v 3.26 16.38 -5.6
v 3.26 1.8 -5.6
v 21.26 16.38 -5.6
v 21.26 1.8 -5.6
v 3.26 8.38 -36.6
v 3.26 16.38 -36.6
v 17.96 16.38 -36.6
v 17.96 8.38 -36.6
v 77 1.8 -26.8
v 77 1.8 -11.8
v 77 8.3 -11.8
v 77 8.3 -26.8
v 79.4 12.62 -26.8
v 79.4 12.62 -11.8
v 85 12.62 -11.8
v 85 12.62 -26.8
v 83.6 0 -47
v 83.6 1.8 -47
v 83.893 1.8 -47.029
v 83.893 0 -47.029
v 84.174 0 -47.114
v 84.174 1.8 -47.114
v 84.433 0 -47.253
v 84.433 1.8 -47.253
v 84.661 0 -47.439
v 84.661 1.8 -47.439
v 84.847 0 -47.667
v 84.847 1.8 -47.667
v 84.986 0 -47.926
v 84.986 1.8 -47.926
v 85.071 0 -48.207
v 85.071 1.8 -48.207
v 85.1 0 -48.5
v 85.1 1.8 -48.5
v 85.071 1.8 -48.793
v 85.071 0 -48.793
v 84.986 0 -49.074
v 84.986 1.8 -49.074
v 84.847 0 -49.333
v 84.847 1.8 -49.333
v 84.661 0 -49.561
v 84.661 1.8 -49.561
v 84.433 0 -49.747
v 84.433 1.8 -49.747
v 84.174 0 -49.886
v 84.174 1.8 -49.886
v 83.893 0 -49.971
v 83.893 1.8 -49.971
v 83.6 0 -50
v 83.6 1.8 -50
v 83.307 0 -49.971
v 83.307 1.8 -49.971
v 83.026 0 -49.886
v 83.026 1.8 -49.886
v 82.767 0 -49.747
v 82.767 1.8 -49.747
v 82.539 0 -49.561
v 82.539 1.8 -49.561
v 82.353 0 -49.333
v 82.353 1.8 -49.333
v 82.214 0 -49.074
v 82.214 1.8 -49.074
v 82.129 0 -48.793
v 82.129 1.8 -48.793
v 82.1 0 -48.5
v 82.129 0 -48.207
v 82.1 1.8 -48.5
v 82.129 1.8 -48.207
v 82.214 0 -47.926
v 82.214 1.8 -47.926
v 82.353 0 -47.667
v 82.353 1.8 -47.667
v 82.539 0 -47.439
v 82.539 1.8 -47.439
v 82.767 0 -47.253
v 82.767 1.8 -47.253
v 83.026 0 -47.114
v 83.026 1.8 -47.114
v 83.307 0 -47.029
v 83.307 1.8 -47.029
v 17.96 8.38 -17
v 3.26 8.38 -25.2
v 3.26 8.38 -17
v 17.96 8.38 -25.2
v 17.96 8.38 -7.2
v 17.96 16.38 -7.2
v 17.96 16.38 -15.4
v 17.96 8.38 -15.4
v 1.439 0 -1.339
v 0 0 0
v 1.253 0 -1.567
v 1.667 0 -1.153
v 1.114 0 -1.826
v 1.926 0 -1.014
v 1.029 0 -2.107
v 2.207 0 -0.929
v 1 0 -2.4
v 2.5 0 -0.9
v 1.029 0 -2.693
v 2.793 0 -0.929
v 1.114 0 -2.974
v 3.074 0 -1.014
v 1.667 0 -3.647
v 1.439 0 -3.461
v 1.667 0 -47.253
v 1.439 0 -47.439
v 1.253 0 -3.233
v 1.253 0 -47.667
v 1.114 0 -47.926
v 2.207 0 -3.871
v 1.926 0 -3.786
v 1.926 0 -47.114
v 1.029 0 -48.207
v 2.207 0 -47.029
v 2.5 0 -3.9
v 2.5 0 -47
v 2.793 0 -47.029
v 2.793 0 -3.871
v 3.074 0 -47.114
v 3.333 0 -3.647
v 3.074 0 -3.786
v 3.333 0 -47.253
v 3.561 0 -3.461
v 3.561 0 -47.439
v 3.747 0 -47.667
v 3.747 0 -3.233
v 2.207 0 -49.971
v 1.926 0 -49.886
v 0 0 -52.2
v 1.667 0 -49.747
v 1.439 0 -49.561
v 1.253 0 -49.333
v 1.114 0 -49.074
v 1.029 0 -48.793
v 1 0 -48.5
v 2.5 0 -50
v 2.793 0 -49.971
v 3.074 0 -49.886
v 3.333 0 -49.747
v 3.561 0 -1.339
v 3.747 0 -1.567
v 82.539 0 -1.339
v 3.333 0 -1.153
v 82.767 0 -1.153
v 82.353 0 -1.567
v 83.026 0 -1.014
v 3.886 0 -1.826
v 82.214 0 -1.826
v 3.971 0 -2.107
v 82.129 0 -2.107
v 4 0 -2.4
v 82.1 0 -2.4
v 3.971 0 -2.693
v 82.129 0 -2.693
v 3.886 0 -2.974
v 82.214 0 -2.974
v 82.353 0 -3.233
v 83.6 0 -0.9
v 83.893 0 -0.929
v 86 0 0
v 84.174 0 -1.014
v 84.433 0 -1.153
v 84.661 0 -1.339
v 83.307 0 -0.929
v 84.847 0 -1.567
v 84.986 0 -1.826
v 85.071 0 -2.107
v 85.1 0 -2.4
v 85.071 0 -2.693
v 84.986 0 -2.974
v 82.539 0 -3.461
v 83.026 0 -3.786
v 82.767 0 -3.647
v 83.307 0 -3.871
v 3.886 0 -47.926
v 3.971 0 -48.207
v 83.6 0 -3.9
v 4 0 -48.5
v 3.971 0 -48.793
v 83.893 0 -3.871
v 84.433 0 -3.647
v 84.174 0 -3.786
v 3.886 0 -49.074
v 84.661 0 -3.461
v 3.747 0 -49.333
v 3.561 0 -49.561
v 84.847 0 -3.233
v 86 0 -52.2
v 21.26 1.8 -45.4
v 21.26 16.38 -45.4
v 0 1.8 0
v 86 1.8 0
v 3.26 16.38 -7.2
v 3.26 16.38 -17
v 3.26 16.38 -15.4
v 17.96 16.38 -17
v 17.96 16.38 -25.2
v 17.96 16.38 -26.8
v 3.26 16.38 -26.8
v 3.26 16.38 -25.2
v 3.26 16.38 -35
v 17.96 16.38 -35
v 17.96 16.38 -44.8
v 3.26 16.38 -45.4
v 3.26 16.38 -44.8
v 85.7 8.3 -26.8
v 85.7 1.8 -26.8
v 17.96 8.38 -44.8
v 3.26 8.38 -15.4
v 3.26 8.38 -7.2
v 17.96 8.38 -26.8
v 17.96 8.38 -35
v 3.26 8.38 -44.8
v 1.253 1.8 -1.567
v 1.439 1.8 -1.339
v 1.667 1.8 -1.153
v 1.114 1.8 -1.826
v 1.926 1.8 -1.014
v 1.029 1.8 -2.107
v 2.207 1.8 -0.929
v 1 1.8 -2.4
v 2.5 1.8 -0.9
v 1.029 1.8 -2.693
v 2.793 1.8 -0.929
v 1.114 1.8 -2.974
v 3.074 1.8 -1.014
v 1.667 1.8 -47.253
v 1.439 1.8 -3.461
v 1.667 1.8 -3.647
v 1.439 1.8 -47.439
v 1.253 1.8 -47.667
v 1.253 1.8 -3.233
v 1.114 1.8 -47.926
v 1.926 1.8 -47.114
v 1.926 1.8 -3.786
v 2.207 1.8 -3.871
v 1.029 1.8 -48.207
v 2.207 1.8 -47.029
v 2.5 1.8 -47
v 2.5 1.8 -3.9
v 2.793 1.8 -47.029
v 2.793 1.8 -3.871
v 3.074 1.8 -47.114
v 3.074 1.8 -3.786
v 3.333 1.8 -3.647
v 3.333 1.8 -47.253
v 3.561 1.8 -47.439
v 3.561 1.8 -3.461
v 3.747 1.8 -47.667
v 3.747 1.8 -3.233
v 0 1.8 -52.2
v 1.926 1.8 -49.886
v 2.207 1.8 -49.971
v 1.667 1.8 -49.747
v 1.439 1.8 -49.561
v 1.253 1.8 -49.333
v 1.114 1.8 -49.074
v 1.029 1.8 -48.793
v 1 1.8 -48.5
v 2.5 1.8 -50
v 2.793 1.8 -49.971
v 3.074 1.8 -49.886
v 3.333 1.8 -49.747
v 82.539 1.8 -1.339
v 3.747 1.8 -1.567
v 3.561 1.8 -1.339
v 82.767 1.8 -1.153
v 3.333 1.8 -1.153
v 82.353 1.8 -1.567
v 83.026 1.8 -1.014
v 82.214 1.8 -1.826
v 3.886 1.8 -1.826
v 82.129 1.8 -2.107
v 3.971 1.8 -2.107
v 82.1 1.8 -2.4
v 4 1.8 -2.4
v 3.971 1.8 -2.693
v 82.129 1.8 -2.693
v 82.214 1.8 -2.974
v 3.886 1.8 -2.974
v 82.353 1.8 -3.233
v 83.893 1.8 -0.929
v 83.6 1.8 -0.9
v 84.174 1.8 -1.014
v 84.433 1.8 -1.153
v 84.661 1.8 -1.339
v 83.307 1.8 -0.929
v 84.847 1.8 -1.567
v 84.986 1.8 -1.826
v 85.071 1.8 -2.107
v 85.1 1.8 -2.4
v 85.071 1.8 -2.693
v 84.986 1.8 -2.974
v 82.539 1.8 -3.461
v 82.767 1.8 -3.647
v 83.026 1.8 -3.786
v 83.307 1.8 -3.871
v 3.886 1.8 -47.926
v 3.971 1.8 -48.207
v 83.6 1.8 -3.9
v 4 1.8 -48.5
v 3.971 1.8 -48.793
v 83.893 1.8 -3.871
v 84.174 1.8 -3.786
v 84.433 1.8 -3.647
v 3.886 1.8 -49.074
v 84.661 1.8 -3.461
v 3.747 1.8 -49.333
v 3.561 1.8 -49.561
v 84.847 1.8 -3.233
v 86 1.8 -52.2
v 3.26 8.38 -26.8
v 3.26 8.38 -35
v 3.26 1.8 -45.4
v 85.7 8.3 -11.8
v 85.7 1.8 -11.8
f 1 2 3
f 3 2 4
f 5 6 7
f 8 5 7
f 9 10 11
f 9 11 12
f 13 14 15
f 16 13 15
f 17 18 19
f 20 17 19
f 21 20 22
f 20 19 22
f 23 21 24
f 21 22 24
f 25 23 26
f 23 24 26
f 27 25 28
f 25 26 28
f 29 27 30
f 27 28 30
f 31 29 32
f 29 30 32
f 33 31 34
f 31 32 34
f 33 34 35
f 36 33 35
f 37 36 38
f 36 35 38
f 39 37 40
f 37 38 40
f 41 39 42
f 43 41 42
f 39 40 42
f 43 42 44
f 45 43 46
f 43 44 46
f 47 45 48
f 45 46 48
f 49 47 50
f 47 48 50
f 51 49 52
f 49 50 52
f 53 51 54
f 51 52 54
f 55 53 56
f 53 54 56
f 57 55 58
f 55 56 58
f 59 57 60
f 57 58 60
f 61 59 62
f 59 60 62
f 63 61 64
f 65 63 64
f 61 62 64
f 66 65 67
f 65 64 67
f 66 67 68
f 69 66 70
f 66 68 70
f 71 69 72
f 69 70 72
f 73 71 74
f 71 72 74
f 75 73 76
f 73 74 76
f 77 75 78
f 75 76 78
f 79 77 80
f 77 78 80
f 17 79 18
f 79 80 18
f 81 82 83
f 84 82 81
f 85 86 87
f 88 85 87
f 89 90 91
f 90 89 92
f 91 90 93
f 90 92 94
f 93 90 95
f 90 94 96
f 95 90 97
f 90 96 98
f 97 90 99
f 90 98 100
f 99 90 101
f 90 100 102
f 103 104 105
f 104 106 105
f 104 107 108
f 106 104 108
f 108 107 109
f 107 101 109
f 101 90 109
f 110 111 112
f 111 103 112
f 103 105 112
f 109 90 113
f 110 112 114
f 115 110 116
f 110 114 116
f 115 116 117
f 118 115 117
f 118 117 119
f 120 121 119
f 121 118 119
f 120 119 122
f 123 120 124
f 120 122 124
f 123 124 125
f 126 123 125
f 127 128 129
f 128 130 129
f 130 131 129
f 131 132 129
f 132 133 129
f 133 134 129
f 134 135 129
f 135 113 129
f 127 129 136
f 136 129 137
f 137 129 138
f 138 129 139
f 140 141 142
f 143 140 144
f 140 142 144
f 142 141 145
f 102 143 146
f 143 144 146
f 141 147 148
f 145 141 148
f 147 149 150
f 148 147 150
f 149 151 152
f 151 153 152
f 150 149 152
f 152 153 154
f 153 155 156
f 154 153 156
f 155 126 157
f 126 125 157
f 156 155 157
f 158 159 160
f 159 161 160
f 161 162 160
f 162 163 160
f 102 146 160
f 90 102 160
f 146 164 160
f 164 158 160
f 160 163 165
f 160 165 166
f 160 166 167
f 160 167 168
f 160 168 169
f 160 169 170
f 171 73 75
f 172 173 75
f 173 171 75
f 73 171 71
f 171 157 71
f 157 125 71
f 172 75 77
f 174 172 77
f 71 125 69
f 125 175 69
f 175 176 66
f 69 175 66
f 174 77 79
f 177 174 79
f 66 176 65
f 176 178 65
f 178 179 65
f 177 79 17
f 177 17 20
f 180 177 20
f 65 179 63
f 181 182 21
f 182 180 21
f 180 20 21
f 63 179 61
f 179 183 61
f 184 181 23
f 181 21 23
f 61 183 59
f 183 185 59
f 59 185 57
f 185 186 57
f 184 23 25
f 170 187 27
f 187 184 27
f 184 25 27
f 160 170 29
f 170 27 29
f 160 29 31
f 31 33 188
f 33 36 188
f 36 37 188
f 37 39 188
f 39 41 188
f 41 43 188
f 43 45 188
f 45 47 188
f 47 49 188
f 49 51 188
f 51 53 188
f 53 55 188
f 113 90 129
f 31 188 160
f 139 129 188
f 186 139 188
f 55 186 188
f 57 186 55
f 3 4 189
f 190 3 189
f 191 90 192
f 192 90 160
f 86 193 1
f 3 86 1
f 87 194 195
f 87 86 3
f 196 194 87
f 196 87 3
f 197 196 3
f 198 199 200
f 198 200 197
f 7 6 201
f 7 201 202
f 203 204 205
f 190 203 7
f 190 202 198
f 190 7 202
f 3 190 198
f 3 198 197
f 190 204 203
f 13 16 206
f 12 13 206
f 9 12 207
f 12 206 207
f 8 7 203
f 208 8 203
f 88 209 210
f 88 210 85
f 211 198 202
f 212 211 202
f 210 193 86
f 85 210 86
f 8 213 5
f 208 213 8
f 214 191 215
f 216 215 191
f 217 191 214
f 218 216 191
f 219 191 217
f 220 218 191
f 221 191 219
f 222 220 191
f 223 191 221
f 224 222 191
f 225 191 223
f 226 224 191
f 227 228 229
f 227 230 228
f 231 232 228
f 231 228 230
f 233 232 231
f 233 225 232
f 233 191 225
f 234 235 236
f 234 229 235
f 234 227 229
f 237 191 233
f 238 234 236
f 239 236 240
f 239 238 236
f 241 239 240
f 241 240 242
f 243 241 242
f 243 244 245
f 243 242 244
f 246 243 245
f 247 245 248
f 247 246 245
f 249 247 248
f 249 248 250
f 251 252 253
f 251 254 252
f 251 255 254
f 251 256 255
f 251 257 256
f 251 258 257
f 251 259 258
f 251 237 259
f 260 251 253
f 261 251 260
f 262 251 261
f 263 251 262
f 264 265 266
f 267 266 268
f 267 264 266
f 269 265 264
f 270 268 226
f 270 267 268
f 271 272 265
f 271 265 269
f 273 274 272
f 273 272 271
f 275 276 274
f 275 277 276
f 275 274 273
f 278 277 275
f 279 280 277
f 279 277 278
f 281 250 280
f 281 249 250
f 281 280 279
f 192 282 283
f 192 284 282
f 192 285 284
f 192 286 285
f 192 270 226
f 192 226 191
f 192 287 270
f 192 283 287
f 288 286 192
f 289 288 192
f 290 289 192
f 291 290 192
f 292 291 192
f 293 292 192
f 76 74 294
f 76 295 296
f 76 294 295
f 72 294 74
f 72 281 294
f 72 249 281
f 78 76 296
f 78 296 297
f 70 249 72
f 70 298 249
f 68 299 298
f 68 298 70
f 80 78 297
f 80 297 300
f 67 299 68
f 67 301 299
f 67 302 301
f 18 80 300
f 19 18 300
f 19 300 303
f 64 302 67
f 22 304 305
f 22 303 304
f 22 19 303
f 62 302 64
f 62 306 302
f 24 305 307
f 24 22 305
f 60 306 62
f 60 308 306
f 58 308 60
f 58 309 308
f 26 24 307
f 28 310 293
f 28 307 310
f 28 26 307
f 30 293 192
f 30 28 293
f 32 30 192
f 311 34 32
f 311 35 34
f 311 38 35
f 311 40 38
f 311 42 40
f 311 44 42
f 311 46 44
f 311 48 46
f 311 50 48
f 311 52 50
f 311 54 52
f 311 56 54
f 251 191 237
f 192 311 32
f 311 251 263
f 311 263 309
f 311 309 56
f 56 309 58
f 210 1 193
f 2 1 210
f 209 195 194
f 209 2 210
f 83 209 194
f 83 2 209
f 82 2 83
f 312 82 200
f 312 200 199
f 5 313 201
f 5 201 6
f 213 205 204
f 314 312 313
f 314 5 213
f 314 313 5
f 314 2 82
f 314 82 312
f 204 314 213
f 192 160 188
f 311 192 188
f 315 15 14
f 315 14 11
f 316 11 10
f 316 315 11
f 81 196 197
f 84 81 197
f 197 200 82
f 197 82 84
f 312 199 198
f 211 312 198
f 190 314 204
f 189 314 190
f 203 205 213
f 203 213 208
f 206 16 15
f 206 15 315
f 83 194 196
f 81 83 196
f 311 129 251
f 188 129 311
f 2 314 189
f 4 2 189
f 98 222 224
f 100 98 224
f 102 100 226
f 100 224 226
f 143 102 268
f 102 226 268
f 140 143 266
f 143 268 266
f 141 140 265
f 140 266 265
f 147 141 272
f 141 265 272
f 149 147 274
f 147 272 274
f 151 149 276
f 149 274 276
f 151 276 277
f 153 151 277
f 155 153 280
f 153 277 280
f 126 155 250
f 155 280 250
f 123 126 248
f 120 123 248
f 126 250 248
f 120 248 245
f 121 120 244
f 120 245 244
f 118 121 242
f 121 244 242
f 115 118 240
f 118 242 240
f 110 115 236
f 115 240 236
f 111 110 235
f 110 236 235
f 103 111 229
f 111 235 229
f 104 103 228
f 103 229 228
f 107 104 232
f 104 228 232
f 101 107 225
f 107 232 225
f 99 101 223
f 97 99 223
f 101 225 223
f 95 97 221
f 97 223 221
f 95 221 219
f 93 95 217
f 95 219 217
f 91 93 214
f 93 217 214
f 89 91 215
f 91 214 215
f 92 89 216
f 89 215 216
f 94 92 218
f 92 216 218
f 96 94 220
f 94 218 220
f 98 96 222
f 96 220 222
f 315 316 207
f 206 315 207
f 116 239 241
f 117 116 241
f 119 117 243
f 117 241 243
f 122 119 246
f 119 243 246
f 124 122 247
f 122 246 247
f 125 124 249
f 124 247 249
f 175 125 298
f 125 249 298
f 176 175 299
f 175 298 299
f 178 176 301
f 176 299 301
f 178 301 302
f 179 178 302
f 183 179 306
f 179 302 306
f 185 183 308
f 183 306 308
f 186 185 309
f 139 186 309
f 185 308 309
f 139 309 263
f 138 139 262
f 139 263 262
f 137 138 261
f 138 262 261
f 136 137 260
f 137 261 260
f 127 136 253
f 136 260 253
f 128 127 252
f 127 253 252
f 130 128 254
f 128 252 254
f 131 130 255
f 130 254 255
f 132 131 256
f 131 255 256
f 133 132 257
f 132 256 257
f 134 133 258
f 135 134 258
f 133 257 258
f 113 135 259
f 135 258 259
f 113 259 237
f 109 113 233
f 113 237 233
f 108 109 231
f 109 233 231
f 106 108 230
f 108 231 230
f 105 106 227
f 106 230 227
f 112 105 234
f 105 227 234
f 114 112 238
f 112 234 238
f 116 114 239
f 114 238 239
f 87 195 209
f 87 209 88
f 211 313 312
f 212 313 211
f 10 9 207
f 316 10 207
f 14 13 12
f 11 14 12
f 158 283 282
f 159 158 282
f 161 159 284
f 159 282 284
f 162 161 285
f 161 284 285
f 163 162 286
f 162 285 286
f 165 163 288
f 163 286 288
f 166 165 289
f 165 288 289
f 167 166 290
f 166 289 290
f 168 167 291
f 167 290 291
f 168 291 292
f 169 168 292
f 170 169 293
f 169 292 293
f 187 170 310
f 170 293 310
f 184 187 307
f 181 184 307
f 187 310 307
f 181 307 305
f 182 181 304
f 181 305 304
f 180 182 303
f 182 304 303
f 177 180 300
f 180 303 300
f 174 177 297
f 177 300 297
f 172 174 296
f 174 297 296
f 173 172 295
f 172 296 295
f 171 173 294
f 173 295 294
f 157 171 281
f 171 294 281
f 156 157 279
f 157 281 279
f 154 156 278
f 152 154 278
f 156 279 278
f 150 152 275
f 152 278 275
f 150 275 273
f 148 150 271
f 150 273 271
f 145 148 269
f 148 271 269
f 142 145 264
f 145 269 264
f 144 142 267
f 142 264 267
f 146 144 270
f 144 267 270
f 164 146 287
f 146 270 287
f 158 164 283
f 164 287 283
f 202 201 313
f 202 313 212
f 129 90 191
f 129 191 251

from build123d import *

# Parameters (mm, degrees)
SKETCH1_W           = 86
SKETCH1_H           = 52.2
BOSS_EXTRUDE1_DEPTH = 1.8
SKETCH3_R           = 1.5
CUT_EXTRUDE1_DEPTH  = 1.8
SKETCH4_W           = 8.7
SKETCH4_H           = 15
BOSS_EXTRUDE2_DEPTH = 6.5
SKETCH5_W           = 5.6
SKETCH5_H           = 15
BOSS_EXTRUDE3_DEPTH = 4.32
RIB11_REACH         = 94.939
SKETCH7_WALL_W      = 192.82008193
SKETCH7_WALL_H      = 15
RIB14_REACH         = 94.939
SKETCH8_WALL_W      = 192.25452497
SKETCH8_WALL_H      = 15
SKETCH9_W           = 18
SKETCH9_H           = 39.8
BOSS_EXTRUDE4_DEPTH = 14.58
SKETCH10_W          = 14.7
SKETCH10_H          = 8.2
CUT_EXTRUDE2_DEPTH  = 8


with BuildPart() as part:
    # Sketch1 → Boss-Extrude1 (new body)
    with BuildSketch(Plane(origin=(0, 0, 0), x_dir=(1, 0, 0), z_dir=(0, 1, 0))):
        with Locations((43, 26.1)):
            Rectangle(SKETCH1_W, SKETCH1_H)
    extrude(amount=BOSS_EXTRUDE1_DEPTH)

    # Sketch3 → Cut-Extrude1 (cut)
    with BuildSketch(Plane(origin=(0, 1.8, 0), x_dir=(1, 0, 0), z_dir=(0, 1, 0))):
        with Locations(Location((83.6, 2.4, 0), (0, 0, 270))):
            Circle(SKETCH3_R)
        with Locations(Location((83.6, 48.5, 0), (0, 0, 270))):
            Circle(SKETCH3_R)
        with Locations(Location((2.5, 2.4, 0), (0, 0, 270))):
            Circle(SKETCH3_R)
        with Locations(Location((2.5, 48.5, 0), (0, 0, 270))):
            Circle(SKETCH3_R)
    extrude(amount=-CUT_EXTRUDE1_DEPTH, mode=Mode.SUBTRACT)


with BuildPart() as body_2:
    # Sketch4 → Boss-Extrude2 (new body)
    with BuildSketch(Plane(origin=(0, 1.8, 0), x_dir=(1, 0, 0), z_dir=(0, 1, 0))):
        with Locations((81.35, 19.3)):
            Rectangle(SKETCH4_W, SKETCH4_H)
    extrude(amount=BOSS_EXTRUDE2_DEPTH)

    # Sketch5 → Boss-Extrude3 (add)
    with BuildSketch(Plane(origin=(0, 8.3, 0), x_dir=(1, 0, 0), z_dir=(0, 1, 0))):
        with Locations((82.2, 19.3)):
            Rectangle(SKETCH5_W, SKETCH5_H)
    extrude(amount=BOSS_EXTRUDE3_DEPTH)

    # Sketch7 wall → Rib11 (add, up to next)
    with BuildSketch(Plane(origin=(78.2, 10.46, -19.3), x_dir=(-0.485642931179, -0.874157276122, 0), z_dir=(0.874157276122, -0.485642931179, 0)), mode=Mode.PRIVATE) as rib11_sk1:
        Rectangle(SKETCH7_WALL_W, SKETCH7_WALL_H)
    rib11_tool1 = extrude(rib11_sk1.sketch, amount=RIB11_REACH, mode=Mode.PRIVATE) - body_2.part
    add(rib11_tool1.solids().sort_by_distance((78.2, 10.46, -19.3))[0])

    # Sketch8 wall → Rib14 (add, up to next)
    with BuildSketch(Plane(origin=(85.35, 10.46, -19.3), x_dir=(0.159950808002, -0.987124986524, 0), z_dir=(0.987124986524, 0.159950808002, 0)), mode=Mode.PRIVATE) as rib14_sk1:
        Rectangle(SKETCH8_WALL_W, SKETCH8_WALL_H)
    rib14_tool1 = extrude(rib14_sk1.sketch, amount=-RIB14_REACH, mode=Mode.PRIVATE) - body_2.part
    add(rib14_tool1.solids().sort_by_distance((85.35, 10.46, -19.3))[0])


with BuildPart() as body_3:
    # Sketch9 → Boss-Extrude4 (new body)
    with BuildSketch(Plane(origin=(0, 1.8, 0), x_dir=(1, 0, 0), z_dir=(0, 1, 0))):
        with Locations((12.26, 25.5)):
            Rectangle(SKETCH9_W, SKETCH9_H)
    extrude(amount=BOSS_EXTRUDE4_DEPTH)

    # Sketch10 → Cut-Extrude2 (cut)
    with BuildSketch(Plane(origin=(0, 16.38, 0), x_dir=(1, 0, 0), z_dir=(0, 1, 0))):
        with Locations((10.61, 11.3)):
            Rectangle(SKETCH10_W, SKETCH10_H)
        with Locations((10.61, 21.1)):
            Rectangle(SKETCH10_W, SKETCH10_H)
        with Locations((10.61, 30.9)):
            Rectangle(SKETCH10_W, SKETCH10_H)
        with Locations((10.61, 40.7)):
            Rectangle(SKETCH10_W, SKETCH10_H)
    extrude(amount=-CUT_EXTRUDE2_DEPTH, mode=Mode.SUBTRACT)


solid = Compound([part.part, body_2.part, body_3.part])
